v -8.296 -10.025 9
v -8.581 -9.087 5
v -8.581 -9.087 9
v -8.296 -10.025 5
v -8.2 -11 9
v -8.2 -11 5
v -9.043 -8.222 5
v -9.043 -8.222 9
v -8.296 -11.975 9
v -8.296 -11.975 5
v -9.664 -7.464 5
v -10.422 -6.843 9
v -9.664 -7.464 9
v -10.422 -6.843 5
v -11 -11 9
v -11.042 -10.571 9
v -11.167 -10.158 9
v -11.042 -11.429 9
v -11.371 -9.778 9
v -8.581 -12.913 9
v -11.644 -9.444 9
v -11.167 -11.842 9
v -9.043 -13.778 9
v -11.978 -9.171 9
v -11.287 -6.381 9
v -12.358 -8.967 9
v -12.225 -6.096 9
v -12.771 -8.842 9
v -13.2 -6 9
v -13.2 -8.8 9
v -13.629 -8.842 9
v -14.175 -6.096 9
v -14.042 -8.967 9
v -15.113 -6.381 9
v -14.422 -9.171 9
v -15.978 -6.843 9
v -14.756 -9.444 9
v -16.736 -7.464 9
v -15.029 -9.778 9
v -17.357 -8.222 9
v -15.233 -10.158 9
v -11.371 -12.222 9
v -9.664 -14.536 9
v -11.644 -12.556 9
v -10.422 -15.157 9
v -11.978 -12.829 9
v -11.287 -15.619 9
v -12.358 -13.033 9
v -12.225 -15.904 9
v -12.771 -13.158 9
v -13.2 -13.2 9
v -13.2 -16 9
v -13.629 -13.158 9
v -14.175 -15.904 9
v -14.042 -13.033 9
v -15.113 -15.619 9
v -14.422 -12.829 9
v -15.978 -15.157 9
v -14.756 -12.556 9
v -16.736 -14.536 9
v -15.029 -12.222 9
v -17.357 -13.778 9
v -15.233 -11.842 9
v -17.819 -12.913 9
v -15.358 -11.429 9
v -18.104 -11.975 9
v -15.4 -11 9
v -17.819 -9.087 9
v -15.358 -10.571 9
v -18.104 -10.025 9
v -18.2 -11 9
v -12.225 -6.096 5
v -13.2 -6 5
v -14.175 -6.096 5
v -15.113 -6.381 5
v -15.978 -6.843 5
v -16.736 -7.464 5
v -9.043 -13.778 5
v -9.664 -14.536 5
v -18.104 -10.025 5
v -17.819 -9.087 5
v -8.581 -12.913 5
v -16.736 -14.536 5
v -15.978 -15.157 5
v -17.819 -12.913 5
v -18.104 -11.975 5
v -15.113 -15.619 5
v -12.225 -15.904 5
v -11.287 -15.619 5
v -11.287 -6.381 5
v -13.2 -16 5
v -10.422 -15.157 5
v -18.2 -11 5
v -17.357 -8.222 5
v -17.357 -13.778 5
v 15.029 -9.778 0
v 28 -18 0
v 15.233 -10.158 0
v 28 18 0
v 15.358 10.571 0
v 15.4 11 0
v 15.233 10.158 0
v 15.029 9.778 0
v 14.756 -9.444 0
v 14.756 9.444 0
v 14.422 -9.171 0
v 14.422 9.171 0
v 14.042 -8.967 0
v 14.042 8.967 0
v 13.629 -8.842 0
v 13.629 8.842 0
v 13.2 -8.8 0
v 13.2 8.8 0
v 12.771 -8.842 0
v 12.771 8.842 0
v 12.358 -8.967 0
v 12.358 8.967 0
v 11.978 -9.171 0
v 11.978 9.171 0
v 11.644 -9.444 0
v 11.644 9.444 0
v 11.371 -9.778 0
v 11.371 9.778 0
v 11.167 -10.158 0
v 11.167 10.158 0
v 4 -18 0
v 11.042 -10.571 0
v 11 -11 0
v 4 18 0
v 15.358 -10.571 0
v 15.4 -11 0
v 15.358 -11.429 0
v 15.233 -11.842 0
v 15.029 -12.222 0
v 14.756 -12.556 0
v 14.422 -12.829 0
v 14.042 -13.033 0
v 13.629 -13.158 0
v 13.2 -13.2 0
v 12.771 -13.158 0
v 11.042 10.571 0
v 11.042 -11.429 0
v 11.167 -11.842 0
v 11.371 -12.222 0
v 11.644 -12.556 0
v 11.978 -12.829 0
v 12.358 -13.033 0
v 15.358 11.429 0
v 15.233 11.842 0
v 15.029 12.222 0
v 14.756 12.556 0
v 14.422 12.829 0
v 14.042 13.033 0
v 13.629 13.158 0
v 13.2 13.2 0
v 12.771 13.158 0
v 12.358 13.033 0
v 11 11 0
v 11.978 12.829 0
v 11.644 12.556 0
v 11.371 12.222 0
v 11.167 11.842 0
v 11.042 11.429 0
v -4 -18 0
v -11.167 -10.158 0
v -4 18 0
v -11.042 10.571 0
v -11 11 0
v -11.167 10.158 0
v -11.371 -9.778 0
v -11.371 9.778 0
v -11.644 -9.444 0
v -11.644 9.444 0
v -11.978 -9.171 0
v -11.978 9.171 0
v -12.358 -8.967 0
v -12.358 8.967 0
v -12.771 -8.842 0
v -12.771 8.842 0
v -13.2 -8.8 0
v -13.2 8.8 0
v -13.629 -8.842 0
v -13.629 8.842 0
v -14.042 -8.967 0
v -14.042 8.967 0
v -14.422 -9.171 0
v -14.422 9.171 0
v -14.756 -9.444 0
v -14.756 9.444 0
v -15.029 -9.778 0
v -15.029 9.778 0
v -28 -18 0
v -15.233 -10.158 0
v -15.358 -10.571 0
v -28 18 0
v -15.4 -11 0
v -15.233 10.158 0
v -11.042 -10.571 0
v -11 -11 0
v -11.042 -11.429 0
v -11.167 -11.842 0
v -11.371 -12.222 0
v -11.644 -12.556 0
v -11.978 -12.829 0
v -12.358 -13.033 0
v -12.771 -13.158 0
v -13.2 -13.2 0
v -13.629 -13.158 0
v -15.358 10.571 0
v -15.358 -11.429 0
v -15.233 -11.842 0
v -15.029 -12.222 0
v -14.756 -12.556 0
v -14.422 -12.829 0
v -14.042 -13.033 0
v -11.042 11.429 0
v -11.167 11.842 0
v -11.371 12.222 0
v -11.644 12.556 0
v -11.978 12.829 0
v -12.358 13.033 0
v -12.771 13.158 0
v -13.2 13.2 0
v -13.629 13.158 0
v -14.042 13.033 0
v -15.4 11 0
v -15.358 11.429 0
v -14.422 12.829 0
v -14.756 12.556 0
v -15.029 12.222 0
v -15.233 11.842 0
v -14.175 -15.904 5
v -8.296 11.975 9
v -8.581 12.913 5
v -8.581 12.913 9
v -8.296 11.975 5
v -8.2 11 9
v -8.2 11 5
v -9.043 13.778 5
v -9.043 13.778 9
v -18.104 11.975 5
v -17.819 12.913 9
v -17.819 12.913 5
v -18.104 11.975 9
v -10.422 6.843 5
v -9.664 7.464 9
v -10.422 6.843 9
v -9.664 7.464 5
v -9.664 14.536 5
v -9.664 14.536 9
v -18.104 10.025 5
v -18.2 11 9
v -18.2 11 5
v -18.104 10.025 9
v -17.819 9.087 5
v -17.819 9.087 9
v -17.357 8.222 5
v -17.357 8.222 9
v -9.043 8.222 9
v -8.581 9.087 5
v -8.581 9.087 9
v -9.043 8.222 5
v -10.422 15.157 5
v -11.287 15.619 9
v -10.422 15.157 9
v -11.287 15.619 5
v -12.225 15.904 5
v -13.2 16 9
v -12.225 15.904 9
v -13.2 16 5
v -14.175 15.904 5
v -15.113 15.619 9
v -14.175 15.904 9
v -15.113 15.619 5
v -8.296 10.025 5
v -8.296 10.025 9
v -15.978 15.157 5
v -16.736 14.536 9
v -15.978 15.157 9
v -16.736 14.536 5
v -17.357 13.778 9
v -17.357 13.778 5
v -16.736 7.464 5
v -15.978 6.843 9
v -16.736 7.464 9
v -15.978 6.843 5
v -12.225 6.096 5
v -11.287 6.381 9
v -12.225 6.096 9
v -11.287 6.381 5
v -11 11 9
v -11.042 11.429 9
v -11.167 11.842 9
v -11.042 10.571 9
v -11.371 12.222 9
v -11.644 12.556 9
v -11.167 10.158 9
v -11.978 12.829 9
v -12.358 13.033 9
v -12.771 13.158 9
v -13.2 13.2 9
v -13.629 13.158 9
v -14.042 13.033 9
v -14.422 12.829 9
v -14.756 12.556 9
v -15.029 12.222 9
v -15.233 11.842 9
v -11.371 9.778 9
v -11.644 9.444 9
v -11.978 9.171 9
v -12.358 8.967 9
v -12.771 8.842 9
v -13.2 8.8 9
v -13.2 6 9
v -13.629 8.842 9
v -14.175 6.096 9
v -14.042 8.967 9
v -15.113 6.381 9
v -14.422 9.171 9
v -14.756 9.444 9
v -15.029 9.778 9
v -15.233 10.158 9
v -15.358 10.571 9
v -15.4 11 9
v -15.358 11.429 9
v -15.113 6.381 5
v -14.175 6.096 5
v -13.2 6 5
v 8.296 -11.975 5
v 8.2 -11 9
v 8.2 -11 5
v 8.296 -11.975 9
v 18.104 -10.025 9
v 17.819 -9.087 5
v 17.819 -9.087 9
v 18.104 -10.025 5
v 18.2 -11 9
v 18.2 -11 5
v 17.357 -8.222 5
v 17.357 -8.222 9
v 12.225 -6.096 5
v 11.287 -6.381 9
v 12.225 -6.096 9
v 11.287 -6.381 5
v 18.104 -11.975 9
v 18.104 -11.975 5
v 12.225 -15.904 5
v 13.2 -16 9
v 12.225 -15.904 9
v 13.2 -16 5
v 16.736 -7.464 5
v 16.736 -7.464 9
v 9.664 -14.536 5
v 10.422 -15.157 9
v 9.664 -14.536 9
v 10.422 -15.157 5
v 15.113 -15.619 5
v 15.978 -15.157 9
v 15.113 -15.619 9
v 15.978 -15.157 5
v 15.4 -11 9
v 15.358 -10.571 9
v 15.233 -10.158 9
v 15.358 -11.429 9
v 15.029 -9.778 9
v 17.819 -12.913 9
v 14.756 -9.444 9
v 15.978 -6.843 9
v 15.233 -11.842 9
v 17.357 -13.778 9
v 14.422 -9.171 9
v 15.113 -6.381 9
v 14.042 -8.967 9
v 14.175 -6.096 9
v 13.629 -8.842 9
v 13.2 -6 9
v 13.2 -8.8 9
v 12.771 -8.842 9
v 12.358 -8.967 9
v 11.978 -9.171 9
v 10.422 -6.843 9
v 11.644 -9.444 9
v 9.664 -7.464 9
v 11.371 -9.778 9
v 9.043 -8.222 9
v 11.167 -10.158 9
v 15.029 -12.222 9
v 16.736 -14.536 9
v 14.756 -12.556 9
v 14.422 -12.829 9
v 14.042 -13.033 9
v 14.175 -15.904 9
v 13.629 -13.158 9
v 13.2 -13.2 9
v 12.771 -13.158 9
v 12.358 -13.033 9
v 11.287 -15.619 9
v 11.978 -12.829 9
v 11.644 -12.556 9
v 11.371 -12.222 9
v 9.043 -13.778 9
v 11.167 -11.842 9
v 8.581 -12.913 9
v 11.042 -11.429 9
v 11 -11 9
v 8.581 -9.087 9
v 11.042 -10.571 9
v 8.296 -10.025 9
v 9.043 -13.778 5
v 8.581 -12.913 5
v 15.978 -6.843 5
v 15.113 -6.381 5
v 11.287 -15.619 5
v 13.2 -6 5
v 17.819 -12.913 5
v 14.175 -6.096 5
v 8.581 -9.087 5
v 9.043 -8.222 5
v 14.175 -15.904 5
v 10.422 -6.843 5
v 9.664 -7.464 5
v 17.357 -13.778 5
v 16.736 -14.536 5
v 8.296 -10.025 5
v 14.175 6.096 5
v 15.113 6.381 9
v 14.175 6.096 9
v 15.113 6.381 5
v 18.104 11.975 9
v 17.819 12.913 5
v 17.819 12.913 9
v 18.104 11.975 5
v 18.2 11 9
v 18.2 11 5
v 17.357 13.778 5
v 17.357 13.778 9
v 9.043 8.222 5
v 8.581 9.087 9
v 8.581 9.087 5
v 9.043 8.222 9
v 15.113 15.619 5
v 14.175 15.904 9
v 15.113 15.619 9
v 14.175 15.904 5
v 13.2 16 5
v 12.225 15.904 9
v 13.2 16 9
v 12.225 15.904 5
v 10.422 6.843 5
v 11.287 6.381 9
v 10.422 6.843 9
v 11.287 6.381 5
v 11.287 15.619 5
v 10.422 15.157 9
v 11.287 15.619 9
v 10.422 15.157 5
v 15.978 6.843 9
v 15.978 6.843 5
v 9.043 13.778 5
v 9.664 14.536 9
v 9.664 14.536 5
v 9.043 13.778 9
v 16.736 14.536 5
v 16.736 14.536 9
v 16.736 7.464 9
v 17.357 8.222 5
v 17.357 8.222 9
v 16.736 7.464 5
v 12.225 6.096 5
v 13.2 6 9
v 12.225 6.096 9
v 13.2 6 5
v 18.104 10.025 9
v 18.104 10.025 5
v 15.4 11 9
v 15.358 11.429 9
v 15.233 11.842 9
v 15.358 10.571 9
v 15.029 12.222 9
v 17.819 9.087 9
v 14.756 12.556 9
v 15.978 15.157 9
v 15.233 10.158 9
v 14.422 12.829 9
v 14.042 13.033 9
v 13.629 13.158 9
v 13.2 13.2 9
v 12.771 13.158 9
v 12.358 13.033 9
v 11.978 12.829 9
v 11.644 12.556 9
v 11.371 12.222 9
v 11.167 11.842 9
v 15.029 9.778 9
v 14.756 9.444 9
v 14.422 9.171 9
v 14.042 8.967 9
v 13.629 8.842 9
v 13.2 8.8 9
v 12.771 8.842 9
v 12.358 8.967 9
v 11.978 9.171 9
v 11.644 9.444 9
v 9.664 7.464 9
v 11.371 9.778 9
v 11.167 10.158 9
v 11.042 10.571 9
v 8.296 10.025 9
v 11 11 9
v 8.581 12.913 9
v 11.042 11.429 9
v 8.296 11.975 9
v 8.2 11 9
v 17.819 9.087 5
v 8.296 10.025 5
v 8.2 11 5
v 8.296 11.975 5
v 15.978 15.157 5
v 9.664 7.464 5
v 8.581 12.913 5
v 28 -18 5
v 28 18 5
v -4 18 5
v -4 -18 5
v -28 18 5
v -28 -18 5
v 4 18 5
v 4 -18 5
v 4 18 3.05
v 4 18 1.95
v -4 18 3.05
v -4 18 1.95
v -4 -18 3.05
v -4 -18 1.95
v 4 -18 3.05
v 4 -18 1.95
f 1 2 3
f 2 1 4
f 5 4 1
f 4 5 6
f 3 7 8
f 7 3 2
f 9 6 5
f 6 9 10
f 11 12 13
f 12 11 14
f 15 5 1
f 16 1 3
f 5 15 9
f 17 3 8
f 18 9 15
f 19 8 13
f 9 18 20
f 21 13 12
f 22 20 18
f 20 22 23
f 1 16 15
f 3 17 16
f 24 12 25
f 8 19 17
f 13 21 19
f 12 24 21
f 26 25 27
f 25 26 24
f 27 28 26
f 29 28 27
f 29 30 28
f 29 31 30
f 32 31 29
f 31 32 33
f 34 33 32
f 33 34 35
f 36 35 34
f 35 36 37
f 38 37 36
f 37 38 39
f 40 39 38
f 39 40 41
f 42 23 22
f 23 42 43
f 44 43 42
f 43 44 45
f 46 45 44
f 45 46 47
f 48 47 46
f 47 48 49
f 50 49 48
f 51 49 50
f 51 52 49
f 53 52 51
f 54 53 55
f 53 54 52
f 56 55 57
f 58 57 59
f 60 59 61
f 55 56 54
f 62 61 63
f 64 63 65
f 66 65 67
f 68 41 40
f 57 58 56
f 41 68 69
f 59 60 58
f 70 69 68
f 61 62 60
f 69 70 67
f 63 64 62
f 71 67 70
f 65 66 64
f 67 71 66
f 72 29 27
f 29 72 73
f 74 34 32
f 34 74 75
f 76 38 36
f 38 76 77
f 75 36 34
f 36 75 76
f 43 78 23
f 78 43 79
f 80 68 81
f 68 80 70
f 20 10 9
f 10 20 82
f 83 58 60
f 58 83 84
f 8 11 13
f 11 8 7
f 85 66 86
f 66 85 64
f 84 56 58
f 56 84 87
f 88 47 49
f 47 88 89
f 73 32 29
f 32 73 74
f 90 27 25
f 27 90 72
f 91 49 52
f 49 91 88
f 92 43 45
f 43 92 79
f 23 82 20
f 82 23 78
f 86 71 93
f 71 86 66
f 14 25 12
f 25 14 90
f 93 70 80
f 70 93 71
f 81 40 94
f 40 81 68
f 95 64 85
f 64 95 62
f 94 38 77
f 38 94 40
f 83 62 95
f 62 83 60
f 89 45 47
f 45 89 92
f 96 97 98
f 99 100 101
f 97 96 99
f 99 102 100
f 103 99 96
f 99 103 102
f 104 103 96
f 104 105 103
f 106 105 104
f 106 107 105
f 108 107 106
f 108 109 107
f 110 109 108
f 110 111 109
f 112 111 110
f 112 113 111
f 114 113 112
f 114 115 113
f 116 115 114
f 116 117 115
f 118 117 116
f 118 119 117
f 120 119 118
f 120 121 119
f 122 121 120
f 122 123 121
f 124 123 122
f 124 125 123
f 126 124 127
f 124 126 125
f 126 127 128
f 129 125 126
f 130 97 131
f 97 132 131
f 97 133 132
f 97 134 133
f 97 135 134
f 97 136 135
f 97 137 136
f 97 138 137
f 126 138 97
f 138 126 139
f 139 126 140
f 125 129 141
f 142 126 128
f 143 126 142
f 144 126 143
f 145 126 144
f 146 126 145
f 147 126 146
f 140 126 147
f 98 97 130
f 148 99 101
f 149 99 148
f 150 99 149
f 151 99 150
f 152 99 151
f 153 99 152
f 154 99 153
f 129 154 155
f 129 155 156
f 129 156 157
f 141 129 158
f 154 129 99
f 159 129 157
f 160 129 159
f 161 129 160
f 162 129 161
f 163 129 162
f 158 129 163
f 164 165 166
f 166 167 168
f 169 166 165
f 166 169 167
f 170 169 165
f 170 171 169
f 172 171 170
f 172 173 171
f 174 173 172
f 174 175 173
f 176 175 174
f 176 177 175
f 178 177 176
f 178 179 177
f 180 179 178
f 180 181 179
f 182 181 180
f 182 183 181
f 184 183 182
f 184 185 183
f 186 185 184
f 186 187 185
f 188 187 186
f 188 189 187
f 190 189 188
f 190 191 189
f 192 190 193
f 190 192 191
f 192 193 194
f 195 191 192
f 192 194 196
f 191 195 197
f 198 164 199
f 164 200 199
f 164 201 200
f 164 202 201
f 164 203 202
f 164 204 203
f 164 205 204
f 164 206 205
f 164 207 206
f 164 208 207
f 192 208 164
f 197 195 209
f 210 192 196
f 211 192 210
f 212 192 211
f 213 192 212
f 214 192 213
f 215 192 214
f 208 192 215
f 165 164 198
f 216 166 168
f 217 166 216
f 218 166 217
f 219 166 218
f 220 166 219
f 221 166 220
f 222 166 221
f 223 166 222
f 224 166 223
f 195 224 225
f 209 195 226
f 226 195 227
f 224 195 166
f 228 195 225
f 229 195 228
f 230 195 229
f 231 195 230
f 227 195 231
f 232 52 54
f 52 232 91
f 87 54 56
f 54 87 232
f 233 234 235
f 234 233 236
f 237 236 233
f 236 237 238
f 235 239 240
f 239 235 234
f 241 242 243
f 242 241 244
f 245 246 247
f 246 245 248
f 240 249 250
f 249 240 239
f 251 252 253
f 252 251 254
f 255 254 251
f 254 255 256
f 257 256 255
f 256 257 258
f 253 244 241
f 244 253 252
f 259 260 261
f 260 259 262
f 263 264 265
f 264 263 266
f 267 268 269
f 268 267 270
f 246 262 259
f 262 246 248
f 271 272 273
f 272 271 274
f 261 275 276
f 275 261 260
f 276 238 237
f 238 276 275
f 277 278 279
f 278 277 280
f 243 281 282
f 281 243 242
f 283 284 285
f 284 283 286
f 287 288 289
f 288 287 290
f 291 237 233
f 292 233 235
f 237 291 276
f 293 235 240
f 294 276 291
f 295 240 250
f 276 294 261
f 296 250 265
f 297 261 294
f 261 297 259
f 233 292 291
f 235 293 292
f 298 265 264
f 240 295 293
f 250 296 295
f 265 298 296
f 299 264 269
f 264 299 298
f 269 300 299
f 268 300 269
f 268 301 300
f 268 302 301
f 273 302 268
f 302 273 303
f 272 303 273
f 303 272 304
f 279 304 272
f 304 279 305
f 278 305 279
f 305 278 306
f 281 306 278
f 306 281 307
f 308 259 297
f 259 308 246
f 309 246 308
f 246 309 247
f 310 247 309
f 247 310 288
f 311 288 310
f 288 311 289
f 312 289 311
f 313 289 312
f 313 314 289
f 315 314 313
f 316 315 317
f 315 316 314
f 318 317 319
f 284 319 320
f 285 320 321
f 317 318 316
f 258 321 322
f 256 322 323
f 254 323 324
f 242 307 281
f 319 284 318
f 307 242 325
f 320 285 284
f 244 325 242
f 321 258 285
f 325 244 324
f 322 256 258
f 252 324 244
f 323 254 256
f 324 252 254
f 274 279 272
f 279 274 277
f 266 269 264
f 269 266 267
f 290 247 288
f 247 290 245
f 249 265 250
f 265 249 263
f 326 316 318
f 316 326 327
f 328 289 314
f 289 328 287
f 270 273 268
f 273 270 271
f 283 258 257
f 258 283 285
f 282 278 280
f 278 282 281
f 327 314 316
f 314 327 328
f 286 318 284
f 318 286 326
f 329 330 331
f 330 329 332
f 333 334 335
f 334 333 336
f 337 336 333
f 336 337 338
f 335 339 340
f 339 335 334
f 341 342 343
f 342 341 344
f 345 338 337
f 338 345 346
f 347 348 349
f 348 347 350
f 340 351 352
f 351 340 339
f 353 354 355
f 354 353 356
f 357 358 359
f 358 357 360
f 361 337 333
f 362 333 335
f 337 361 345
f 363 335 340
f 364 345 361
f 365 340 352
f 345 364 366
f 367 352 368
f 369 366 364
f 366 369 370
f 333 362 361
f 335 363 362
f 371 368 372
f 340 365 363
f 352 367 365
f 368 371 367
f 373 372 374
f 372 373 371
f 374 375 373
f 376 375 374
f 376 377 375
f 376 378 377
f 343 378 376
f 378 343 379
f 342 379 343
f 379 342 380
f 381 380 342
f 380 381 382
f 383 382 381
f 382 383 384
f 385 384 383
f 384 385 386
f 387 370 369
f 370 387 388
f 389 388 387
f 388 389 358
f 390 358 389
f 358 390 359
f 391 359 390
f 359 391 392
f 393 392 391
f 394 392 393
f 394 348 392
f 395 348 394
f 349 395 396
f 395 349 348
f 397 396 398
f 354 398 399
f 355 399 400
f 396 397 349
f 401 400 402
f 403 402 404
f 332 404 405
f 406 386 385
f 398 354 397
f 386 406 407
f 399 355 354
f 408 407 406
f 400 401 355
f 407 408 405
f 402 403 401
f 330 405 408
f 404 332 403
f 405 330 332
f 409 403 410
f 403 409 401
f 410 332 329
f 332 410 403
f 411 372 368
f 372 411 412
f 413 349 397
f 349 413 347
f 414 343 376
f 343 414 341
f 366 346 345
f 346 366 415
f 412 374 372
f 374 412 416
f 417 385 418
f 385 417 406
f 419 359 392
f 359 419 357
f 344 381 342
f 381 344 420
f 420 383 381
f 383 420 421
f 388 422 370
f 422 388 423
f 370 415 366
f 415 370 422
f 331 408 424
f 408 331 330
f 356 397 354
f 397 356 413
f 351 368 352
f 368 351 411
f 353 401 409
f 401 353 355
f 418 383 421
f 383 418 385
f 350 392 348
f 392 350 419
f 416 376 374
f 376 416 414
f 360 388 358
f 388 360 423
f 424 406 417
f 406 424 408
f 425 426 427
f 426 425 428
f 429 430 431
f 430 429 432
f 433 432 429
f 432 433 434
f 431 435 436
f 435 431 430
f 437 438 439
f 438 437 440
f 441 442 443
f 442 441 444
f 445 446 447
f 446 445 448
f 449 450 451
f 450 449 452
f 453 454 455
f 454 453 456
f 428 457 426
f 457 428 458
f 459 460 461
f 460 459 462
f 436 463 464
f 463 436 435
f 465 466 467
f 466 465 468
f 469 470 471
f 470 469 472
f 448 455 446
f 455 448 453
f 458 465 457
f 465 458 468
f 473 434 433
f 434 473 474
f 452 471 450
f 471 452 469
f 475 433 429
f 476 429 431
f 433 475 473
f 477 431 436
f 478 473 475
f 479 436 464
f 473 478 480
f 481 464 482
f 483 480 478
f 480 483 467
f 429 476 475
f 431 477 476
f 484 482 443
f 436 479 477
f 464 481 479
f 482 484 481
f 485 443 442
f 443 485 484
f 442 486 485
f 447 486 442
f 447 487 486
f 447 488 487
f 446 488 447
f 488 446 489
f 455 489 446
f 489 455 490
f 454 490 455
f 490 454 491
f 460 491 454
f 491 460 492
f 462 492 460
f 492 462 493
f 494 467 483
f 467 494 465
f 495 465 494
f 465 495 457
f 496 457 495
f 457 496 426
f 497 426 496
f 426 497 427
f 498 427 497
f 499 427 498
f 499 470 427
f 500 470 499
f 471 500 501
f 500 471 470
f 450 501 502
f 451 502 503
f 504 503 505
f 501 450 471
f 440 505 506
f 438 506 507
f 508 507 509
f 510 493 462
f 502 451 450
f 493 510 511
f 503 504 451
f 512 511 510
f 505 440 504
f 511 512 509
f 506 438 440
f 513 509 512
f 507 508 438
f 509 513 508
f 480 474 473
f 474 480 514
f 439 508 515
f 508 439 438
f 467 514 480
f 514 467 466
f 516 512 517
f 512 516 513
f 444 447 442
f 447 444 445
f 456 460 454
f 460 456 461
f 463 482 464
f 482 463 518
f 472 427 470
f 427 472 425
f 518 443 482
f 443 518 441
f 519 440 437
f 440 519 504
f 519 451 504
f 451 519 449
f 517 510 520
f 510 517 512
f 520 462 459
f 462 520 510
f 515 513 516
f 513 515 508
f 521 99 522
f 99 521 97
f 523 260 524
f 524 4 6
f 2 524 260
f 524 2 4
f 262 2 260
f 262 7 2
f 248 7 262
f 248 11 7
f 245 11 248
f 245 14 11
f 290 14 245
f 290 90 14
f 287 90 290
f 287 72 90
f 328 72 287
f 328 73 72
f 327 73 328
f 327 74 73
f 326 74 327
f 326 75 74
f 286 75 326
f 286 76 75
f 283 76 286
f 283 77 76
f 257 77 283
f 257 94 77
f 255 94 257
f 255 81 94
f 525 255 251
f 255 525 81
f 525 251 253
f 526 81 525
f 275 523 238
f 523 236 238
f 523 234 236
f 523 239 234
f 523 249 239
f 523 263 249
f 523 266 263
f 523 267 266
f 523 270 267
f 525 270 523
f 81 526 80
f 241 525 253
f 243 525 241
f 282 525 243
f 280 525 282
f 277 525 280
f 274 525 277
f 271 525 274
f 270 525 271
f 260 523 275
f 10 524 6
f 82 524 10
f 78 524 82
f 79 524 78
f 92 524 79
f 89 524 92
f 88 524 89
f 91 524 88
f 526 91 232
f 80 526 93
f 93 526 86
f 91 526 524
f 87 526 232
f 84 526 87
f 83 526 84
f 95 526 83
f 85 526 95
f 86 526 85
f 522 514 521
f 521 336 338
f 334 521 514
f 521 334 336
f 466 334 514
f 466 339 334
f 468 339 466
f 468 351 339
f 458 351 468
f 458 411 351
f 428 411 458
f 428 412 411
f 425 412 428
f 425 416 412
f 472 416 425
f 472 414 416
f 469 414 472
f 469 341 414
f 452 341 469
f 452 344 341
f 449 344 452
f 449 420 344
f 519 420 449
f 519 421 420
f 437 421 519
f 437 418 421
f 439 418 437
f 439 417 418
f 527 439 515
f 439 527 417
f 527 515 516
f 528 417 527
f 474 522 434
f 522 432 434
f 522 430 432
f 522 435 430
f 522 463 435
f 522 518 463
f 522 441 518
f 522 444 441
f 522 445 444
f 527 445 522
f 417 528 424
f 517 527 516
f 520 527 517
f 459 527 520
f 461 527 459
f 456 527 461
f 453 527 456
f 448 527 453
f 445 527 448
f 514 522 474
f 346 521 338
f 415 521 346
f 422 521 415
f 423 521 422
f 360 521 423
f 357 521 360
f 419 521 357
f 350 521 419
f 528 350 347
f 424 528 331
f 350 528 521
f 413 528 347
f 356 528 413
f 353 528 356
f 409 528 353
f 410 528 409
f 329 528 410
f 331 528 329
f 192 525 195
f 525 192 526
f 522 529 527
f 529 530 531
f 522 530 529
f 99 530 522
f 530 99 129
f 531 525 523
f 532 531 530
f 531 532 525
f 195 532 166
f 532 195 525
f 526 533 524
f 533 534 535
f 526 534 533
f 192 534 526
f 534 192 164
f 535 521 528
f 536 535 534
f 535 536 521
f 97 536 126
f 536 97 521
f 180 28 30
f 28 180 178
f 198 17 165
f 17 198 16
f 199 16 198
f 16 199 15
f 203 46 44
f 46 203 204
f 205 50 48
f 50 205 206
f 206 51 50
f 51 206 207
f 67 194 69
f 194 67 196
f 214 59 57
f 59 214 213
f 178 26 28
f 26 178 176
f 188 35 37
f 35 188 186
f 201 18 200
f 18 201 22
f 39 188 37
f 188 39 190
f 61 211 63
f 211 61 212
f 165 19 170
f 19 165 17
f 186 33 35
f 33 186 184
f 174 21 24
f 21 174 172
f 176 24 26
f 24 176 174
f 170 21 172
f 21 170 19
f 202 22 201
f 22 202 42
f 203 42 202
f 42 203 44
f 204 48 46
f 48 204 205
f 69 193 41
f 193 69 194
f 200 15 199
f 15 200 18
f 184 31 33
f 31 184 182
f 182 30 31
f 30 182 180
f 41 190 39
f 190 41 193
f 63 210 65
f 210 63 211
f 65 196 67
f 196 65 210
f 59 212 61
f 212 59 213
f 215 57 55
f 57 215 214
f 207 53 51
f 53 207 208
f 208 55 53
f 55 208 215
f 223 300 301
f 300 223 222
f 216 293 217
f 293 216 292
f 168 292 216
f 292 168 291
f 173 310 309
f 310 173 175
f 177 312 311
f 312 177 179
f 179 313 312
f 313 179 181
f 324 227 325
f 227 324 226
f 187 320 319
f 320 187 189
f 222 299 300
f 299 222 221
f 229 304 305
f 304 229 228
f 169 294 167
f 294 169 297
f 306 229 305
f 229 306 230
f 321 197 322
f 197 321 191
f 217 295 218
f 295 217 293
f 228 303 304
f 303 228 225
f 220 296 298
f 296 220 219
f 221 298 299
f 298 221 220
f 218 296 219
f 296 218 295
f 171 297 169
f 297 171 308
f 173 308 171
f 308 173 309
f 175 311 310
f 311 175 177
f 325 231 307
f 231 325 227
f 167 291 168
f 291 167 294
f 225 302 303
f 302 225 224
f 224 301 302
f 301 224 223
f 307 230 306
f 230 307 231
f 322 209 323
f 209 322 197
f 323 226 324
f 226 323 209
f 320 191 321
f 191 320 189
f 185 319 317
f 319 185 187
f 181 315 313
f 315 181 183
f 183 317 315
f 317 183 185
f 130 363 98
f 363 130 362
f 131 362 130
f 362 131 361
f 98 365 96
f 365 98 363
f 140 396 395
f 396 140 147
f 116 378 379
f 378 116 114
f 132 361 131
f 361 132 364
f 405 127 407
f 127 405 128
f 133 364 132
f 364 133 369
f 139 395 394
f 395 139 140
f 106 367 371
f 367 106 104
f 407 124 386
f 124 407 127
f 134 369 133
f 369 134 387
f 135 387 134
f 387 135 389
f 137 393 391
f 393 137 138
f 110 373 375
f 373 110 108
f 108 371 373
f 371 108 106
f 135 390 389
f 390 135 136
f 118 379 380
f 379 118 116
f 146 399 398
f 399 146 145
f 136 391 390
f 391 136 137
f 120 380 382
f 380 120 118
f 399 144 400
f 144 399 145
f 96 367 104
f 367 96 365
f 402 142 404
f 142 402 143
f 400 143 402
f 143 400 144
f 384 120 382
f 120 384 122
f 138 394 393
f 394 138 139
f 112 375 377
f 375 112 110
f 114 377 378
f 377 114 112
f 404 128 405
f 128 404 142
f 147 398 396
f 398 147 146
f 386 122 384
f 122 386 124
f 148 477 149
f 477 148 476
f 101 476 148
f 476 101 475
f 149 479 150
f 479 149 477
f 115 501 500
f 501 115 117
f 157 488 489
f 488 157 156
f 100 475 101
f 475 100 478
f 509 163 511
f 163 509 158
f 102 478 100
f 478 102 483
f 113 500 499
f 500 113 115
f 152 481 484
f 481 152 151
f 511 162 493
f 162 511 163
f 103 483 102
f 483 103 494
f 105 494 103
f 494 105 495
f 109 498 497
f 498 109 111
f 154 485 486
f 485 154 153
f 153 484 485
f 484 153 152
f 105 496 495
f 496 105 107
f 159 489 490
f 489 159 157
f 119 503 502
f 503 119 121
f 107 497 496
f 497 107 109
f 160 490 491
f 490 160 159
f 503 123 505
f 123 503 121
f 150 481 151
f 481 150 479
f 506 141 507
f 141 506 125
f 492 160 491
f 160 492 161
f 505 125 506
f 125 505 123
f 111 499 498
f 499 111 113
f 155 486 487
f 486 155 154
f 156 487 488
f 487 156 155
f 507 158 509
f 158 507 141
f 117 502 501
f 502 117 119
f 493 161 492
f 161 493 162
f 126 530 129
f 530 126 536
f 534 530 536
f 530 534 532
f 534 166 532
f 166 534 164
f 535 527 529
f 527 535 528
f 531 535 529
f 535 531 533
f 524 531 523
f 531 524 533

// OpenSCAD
$fn = 32;

// ----------------------------------------------------------------------
// Living hinge: 56 x 36 mm plates, 1.1 mm flexible web
// ----------------------------------------------------------------------

// --- parameters (mm) ---
plate_len = 24;           // plate length outside the web
plate_w = 36;             // plate width
thick = 5;                // plate thickness
web_half = 4;             // half width of the flex band
web_t = 1.1;              // flexible web thickness
web_z = 1.95;             // web position inside the thickness
boss_d = 10;              // screw boss diameter
boss_h = 9;               // screw boss height
boss_x = 13.2;            // screw boss distance from the web
screw_d = 4.4;            // screw hole

difference() {
  union() {
    /* one flat strip, later thinned at the middle */
    translate([-28, -18, 0]) cube([56, 36, 5]);
    /* screw bosses, sunk 0.5 mm into the plates */
    for (sx = [-13.2, 13.2]) {
      for (sy = [-11, 11]) {
        translate([sx, sy, 0]) cylinder(h = boss_h, d = boss_d);
      }
    }
  }
  /* channel from below: leaves the web on top of it */
  translate([-4, -20.5, -2.5]) cube([8, 41, 4.45]);
  /* channel from above: thins the web down to web_t */
  translate([-4, -20.5, 3.05]) cube([8, 41, 4.45]);
  /* screw holes through the bosses */
  for (sx = [-13.2, 13.2]) {
    for (sy = [-11, 11]) {
      translate([sx, sy, -2.5]) cylinder(h = boss_h + 5, d = screw_d);
    }
  }
}
